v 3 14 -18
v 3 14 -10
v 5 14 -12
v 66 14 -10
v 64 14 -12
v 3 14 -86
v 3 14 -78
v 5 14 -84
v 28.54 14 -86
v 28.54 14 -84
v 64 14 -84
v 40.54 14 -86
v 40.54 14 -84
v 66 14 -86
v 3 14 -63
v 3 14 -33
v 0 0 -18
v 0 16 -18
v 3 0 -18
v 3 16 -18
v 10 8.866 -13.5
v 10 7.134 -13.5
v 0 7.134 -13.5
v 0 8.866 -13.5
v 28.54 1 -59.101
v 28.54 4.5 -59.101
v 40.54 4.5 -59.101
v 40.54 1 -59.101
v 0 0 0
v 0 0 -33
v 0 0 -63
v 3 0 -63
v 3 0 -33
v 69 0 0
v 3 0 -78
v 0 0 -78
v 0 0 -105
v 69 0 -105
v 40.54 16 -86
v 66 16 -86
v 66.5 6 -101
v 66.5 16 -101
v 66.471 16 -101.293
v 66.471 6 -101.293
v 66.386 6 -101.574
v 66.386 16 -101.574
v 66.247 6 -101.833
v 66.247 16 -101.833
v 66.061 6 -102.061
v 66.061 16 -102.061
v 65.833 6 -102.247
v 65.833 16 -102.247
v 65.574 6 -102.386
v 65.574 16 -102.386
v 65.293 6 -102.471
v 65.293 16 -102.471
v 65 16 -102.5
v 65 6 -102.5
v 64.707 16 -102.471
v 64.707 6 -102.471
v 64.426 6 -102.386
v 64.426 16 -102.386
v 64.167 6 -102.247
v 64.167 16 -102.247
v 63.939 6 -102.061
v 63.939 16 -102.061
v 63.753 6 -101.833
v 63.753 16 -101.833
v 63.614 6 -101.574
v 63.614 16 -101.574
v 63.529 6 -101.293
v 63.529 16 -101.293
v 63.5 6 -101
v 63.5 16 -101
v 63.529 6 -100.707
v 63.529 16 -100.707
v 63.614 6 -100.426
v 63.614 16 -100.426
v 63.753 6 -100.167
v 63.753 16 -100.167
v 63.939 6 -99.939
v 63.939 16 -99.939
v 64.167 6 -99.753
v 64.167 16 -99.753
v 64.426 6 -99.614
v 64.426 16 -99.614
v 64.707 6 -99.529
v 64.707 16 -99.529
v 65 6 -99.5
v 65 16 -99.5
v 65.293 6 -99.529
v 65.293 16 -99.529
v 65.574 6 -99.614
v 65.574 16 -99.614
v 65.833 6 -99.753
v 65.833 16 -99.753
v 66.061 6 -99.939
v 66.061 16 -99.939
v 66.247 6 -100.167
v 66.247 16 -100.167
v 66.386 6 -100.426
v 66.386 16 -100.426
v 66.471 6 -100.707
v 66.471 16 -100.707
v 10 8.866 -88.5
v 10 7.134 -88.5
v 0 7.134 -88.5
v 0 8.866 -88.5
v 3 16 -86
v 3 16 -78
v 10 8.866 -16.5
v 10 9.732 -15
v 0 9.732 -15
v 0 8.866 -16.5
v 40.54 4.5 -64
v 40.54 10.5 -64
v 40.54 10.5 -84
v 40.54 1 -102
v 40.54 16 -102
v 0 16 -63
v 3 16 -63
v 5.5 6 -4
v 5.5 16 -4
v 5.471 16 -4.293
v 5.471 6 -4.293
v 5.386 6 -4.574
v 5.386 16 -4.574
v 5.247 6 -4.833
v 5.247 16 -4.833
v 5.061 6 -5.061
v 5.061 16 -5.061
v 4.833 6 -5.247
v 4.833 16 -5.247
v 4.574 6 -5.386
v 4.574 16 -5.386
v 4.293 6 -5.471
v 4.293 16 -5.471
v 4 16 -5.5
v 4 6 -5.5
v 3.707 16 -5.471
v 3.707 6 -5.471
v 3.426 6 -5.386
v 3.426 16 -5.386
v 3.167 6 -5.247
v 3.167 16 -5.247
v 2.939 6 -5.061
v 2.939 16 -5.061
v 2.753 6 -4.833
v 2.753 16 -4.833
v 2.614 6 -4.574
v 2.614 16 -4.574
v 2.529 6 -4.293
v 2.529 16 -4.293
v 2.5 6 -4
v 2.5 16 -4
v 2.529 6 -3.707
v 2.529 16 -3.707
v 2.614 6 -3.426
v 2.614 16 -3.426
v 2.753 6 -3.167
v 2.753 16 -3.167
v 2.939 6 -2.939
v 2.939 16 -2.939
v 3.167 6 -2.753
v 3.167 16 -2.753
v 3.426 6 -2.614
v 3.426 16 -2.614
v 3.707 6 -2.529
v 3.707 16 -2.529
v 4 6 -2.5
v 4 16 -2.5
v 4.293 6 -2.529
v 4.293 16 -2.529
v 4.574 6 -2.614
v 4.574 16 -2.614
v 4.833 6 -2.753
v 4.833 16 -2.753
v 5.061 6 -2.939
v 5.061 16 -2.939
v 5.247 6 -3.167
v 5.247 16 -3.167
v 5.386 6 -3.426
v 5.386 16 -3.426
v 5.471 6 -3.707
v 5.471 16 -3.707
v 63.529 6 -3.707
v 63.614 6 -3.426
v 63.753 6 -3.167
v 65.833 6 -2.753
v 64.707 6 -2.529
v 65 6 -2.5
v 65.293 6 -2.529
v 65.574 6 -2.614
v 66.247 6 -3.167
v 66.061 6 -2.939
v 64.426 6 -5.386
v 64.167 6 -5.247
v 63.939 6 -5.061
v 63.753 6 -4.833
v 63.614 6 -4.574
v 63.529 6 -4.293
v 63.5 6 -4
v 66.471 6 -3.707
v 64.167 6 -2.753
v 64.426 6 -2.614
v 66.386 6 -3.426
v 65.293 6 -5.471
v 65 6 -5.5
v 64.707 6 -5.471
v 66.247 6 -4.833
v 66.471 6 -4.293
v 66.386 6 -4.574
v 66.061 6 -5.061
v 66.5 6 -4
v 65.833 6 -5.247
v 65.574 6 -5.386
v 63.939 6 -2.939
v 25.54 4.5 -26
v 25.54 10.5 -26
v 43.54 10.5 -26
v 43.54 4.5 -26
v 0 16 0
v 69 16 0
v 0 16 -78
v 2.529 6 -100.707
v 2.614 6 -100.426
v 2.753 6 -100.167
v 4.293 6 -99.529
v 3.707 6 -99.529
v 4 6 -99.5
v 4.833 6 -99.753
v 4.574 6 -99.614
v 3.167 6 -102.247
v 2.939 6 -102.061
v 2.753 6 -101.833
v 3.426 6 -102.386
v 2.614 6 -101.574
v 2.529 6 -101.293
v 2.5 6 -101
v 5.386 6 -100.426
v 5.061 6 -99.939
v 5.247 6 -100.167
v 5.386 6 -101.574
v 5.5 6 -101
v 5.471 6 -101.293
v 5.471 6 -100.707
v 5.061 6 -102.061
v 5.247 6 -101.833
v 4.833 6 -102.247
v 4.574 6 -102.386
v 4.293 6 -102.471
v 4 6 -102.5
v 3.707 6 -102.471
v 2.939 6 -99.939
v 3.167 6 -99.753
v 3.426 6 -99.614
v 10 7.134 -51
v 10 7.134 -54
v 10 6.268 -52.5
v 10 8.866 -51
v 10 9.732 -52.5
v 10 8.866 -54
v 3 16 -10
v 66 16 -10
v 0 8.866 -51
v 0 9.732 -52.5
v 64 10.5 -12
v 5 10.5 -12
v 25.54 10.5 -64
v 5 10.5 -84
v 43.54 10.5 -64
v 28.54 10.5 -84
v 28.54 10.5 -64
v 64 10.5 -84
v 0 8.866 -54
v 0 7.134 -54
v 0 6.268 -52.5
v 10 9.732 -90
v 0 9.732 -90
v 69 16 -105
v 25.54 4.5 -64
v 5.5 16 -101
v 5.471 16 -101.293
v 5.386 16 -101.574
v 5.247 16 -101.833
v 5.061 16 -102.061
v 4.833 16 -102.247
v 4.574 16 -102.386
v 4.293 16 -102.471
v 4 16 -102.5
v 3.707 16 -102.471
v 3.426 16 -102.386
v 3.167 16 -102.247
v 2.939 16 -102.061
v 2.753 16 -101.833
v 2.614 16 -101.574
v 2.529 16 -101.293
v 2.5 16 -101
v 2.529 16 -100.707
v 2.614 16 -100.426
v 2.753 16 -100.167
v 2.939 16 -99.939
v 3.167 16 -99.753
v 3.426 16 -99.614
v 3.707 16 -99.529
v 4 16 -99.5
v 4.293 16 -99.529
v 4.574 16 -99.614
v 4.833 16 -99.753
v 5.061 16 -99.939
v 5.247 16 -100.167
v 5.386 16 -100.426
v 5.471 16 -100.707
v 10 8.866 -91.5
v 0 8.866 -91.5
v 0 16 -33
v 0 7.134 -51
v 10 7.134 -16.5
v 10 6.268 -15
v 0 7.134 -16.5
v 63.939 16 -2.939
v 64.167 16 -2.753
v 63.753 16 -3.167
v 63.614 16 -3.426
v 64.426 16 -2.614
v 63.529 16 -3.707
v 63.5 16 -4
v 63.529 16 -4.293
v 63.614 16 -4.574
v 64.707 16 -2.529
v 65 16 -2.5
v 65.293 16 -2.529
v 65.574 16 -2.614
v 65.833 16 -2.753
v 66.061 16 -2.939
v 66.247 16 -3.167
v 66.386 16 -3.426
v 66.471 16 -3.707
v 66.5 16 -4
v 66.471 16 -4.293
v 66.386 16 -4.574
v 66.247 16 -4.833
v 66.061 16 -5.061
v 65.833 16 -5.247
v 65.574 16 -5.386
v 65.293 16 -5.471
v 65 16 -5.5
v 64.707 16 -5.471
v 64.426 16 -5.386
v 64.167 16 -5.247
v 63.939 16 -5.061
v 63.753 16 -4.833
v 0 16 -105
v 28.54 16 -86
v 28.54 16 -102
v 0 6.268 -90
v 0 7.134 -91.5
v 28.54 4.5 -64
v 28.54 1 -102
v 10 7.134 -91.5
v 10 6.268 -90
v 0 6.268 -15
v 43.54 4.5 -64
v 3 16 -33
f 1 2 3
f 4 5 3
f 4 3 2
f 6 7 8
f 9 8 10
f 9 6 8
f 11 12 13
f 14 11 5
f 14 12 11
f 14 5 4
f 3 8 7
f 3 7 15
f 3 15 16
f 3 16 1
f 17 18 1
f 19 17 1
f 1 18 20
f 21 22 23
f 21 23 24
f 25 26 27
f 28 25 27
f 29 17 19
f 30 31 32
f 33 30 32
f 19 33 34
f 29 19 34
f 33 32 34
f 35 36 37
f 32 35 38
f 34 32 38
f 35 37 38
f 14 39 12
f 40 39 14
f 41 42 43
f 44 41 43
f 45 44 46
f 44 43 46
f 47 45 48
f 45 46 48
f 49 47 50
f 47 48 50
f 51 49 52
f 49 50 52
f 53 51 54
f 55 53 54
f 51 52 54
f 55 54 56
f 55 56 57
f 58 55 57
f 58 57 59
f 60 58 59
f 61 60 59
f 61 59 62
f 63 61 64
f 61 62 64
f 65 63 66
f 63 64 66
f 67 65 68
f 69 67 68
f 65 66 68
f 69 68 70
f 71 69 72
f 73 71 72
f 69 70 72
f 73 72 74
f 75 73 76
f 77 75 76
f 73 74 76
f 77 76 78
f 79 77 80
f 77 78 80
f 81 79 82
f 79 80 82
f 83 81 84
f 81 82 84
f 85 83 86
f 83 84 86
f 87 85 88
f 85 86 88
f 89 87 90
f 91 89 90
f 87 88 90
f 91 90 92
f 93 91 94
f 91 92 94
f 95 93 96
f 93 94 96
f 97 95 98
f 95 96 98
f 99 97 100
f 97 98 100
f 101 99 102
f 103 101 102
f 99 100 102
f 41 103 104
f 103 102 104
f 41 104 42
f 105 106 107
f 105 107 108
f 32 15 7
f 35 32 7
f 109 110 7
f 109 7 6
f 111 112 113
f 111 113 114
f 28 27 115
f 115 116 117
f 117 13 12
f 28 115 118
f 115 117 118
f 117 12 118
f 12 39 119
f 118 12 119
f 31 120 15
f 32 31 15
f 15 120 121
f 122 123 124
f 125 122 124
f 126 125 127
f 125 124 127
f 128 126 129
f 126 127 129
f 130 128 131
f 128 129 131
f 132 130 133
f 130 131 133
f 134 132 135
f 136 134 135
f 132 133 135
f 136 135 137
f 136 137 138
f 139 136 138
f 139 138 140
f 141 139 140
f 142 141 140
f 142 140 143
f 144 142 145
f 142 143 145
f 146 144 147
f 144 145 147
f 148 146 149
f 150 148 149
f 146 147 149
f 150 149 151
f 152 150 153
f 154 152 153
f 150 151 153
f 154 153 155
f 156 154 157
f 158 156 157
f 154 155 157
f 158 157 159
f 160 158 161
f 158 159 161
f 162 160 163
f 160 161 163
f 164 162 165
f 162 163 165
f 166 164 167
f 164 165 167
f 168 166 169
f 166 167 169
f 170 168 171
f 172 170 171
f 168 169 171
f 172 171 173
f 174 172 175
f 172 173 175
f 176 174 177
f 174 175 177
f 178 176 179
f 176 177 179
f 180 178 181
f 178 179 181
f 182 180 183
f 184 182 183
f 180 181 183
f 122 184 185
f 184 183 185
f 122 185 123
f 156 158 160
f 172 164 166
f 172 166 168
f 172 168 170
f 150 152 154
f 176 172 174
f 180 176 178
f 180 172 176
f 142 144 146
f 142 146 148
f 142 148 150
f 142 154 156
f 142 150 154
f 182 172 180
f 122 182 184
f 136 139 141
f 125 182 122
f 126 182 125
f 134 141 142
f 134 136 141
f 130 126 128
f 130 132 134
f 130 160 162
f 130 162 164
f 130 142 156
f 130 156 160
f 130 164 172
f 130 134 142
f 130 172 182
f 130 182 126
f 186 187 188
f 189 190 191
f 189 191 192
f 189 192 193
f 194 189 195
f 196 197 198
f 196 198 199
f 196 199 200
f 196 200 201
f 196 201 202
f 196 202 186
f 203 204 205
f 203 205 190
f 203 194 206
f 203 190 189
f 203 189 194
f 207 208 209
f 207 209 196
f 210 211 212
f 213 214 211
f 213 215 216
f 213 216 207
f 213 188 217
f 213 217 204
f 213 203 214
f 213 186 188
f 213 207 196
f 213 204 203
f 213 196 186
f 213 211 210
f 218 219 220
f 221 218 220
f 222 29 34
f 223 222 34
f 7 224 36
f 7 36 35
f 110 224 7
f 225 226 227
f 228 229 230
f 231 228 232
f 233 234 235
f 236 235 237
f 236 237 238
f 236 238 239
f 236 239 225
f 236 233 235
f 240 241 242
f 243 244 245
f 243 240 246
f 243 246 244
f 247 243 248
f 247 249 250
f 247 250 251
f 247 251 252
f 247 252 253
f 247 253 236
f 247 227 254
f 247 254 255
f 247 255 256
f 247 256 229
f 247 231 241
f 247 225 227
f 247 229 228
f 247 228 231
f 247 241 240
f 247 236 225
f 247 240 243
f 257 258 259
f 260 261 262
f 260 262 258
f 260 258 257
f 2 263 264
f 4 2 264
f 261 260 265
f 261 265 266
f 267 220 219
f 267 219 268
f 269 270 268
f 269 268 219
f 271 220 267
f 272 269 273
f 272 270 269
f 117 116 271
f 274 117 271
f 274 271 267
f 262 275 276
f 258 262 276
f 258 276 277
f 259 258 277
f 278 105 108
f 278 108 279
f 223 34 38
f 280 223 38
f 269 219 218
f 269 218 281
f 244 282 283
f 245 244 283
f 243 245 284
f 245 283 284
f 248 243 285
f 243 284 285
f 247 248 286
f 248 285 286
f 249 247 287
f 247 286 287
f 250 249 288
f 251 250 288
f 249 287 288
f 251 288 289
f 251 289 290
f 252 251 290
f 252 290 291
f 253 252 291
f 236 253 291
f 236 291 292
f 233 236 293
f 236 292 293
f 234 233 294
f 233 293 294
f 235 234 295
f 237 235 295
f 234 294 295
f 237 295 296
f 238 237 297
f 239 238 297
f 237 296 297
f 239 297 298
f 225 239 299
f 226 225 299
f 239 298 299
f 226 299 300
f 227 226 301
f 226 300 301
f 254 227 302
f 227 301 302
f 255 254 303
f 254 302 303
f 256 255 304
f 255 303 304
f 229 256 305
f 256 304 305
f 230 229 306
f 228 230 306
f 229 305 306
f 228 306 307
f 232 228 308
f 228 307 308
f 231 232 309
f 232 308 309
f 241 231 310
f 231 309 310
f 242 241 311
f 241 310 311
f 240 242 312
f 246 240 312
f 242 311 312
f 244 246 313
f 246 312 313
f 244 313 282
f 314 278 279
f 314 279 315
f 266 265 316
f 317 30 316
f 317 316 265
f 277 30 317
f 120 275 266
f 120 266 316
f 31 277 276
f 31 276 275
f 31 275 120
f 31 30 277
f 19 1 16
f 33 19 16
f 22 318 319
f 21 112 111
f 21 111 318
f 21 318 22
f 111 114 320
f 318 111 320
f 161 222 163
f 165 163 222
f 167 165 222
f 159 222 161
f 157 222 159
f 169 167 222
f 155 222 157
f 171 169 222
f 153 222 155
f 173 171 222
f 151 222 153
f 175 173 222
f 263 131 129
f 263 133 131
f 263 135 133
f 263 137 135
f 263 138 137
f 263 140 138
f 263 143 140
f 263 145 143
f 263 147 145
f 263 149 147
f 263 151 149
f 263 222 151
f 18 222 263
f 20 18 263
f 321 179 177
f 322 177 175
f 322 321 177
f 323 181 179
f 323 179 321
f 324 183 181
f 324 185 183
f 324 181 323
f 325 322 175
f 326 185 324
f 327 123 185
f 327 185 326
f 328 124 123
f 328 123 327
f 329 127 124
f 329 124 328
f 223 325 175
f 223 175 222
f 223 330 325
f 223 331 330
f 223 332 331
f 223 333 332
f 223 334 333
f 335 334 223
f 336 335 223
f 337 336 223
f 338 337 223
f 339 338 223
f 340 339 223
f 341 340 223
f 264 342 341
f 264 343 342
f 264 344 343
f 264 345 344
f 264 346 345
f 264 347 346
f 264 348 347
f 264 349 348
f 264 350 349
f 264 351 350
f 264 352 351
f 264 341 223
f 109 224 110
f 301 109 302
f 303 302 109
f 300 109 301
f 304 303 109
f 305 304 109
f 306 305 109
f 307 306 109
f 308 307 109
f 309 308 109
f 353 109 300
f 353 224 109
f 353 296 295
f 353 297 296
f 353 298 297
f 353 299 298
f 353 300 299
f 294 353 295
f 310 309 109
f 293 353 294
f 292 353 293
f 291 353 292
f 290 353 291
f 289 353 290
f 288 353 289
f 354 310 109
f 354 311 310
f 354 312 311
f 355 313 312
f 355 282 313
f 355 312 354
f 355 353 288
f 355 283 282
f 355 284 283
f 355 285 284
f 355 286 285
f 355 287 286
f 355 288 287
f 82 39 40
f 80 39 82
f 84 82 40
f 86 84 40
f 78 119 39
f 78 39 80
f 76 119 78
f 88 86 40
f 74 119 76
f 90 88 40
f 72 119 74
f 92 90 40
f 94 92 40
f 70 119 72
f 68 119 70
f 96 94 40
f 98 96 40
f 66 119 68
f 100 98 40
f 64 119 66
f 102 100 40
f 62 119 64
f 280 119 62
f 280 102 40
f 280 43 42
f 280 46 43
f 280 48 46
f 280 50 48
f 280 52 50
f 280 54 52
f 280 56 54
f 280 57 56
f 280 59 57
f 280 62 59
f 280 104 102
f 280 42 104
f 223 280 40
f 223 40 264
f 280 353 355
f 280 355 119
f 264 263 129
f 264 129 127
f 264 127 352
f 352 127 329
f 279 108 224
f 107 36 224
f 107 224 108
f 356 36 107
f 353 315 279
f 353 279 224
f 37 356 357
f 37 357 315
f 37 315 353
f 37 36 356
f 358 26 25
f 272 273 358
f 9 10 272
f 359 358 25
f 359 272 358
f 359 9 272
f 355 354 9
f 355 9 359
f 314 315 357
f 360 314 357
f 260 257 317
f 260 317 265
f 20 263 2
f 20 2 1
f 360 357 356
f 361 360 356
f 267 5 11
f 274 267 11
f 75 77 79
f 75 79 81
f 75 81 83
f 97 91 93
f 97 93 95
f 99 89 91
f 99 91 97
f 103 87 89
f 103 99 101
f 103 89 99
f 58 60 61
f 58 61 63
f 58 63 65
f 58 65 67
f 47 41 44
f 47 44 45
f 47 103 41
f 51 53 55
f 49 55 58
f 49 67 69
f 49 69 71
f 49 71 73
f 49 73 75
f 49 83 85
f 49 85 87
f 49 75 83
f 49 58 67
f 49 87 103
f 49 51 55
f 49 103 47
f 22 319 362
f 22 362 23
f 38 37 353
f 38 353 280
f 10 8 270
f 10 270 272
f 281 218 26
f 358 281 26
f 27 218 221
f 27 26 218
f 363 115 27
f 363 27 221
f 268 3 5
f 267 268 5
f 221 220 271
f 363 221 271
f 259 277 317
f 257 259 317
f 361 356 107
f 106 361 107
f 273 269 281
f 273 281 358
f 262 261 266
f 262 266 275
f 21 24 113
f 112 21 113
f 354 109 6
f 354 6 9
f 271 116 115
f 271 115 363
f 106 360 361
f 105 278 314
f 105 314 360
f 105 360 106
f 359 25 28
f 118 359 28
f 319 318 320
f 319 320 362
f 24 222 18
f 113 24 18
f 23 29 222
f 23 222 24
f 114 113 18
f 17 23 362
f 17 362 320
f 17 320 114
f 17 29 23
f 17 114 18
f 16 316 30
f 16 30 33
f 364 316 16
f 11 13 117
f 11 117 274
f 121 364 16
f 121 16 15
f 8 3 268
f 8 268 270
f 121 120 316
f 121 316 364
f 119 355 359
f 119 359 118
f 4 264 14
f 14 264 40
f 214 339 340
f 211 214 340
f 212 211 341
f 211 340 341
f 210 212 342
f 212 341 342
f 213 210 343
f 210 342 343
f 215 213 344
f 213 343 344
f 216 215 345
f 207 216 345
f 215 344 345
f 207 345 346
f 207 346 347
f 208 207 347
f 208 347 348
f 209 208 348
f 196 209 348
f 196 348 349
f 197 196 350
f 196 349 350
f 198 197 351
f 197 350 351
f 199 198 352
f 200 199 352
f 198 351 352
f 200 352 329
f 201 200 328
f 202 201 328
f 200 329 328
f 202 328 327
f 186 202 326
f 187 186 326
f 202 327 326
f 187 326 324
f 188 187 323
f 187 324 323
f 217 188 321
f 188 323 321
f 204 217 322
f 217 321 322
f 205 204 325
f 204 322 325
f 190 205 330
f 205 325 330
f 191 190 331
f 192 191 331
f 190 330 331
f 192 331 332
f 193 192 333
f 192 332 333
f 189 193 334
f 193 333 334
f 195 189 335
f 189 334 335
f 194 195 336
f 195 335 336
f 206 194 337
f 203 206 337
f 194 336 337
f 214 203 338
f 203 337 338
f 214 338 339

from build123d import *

# Parameters (mm, degrees)
SKETCH1_W           = 69
SKETCH1_H           = 105
BOSS_EXTRUDE1_DEPTH = 16
SKETCH2_W           = 63
SKETCH2_H           = 76
CUT_EXTRUDE1_DEPTH  = 2
SKETCH3_W           = 59
SKETCH3_H           = 72
CUT_EXTRUDE2_DEPTH  = 3.5
SKETCH4_W           = 18
SKETCH4_H           = 38
CUT_EXTRUDE3_DEPTH  = 6
SKETCH5_W           = 12
SKETCH5_H           = 31.473581166
CUT_EXTRUDE4_DEPTH  = 9.5
SKETCH6_W           = 12
SKETCH6_H           = 18
CUT_EXTRUDE5_DEPTH  = 15
SKETCH7_R           = 1.5
CUT_EXTRUDE6_DEPTH  = 10
CUT_EXTRUDE7_DEPTH  = 10
SKETCH13_W          = 3
SKETCH13_H          = 15
CUT_EXTRUDE8_DEPTH  = 17


with BuildPart() as part:
    # Sketch1 → Boss-Extrude1 (new body)
    with BuildSketch(Plane(origin=(0, 0, 0), x_dir=(1, 0, 0), z_dir=(0, 1, 0))):
        with Locations((34.5, 52.5)):
            Rectangle(SKETCH1_W, SKETCH1_H)
    extrude(amount=BOSS_EXTRUDE1_DEPTH)

    # Sketch2 → Cut-Extrude1 (cut)
    with BuildSketch(Plane(origin=(0, 16, 0), x_dir=(1, 0, 0), z_dir=(0, 1, 0))):
        with Locations((34.5, 48)):
            Rectangle(SKETCH2_W, SKETCH2_H)
    extrude(amount=-CUT_EXTRUDE1_DEPTH, mode=Mode.SUBTRACT)

    # Sketch3 → Cut-Extrude2 (cut)
    with BuildSketch(Plane(origin=(0, 14, 0), x_dir=(1, 0, 0), z_dir=(0, 1, 0))):
        with Locations((34.5, 48)):
            Rectangle(SKETCH3_W, SKETCH3_H)
    extrude(amount=-CUT_EXTRUDE2_DEPTH, mode=Mode.SUBTRACT)

    # Sketch4 → Cut-Extrude3 (cut)
    with BuildSketch(Plane(origin=(0, 10.5, 0), x_dir=(1, 0, 0), z_dir=(0, 1, 0))):
        with Locations((34.54, 45)):
            Rectangle(SKETCH4_W, SKETCH4_H)
    extrude(amount=-CUT_EXTRUDE3_DEPTH, mode=Mode.SUBTRACT)

    # Sketch5 → Cut-Extrude4 (cut)
    with BuildSketch(Plane(origin=(0, 10.5, 0), x_dir=(1, 0, 0), z_dir=(0, 1, 0))):
        with Locations((34.54, 74.837937429)):
            Rectangle(SKETCH5_W, SKETCH5_H)
    extrude(amount=-CUT_EXTRUDE4_DEPTH, mode=Mode.SUBTRACT)

    # Sketch6 → Cut-Extrude5 (cut)
    with BuildSketch(Plane(origin=(0, 16, 0), x_dir=(1, 0, 0), z_dir=(0, 1, 0))):
        with Locations((34.54, 93)):
            Rectangle(SKETCH6_W, SKETCH6_H)
    extrude(amount=-CUT_EXTRUDE5_DEPTH, mode=Mode.SUBTRACT)

    # Sketch7 → Cut-Extrude6 (cut)
    with BuildSketch(Plane(origin=(0, 16, 0), x_dir=(1, 0, 0), z_dir=(0, 1, 0))):
        with Locations((4, 4)):
            Circle(SKETCH7_R)
        with Locations((65, 4)):
            Circle(SKETCH7_R)
        with Locations((65, 101)):
            Circle(SKETCH7_R)
        with Locations((4, 101)):
            Circle(SKETCH7_R)
    extrude(amount=-CUT_EXTRUDE6_DEPTH, mode=Mode.SUBTRACT)

    # Sketch10 → Cut-Extrude7 (cut)
    with BuildSketch(Plane.ZY):
        Polygon((-90, 9.732050808), (-91.5, 8.866025404), (-91.5, 7.133974596), (-90, 6.267949192), (-88.5, 7.133974596), (-88.5, 8.866025404), align=None)
        Polygon((-52.5, 9.732050808), (-54, 8.866025404), (-54, 7.133974596), (-52.5, 6.267949192), (-51, 7.133974596), (-51, 8.866025404), align=None)
        Polygon((-15, 9.732050808), (-16.5, 8.866025404), (-16.5, 7.133974596), (-15, 6.267949192), (-13.5, 7.133974596), (-13.5, 8.866025404), align=None)
    extrude(amount=-CUT_EXTRUDE7_DEPTH, mode=Mode.SUBTRACT)

    # Sketch13 → Cut-Extrude8 (cut, through all)
    with BuildSketch(Plane(origin=(0, 16, 0), x_dir=(1, 0, 0), z_dir=(0, 1, 0))):
        with Locations((1.5, 70.5)):
            Rectangle(SKETCH13_W, SKETCH13_H)
        with Locations((1.5, 25.5)):
            Rectangle(SKETCH13_W, SKETCH13_H)
    extrude(amount=-CUT_EXTRUDE8_DEPTH, mode=Mode.SUBTRACT)


solid = part.part
